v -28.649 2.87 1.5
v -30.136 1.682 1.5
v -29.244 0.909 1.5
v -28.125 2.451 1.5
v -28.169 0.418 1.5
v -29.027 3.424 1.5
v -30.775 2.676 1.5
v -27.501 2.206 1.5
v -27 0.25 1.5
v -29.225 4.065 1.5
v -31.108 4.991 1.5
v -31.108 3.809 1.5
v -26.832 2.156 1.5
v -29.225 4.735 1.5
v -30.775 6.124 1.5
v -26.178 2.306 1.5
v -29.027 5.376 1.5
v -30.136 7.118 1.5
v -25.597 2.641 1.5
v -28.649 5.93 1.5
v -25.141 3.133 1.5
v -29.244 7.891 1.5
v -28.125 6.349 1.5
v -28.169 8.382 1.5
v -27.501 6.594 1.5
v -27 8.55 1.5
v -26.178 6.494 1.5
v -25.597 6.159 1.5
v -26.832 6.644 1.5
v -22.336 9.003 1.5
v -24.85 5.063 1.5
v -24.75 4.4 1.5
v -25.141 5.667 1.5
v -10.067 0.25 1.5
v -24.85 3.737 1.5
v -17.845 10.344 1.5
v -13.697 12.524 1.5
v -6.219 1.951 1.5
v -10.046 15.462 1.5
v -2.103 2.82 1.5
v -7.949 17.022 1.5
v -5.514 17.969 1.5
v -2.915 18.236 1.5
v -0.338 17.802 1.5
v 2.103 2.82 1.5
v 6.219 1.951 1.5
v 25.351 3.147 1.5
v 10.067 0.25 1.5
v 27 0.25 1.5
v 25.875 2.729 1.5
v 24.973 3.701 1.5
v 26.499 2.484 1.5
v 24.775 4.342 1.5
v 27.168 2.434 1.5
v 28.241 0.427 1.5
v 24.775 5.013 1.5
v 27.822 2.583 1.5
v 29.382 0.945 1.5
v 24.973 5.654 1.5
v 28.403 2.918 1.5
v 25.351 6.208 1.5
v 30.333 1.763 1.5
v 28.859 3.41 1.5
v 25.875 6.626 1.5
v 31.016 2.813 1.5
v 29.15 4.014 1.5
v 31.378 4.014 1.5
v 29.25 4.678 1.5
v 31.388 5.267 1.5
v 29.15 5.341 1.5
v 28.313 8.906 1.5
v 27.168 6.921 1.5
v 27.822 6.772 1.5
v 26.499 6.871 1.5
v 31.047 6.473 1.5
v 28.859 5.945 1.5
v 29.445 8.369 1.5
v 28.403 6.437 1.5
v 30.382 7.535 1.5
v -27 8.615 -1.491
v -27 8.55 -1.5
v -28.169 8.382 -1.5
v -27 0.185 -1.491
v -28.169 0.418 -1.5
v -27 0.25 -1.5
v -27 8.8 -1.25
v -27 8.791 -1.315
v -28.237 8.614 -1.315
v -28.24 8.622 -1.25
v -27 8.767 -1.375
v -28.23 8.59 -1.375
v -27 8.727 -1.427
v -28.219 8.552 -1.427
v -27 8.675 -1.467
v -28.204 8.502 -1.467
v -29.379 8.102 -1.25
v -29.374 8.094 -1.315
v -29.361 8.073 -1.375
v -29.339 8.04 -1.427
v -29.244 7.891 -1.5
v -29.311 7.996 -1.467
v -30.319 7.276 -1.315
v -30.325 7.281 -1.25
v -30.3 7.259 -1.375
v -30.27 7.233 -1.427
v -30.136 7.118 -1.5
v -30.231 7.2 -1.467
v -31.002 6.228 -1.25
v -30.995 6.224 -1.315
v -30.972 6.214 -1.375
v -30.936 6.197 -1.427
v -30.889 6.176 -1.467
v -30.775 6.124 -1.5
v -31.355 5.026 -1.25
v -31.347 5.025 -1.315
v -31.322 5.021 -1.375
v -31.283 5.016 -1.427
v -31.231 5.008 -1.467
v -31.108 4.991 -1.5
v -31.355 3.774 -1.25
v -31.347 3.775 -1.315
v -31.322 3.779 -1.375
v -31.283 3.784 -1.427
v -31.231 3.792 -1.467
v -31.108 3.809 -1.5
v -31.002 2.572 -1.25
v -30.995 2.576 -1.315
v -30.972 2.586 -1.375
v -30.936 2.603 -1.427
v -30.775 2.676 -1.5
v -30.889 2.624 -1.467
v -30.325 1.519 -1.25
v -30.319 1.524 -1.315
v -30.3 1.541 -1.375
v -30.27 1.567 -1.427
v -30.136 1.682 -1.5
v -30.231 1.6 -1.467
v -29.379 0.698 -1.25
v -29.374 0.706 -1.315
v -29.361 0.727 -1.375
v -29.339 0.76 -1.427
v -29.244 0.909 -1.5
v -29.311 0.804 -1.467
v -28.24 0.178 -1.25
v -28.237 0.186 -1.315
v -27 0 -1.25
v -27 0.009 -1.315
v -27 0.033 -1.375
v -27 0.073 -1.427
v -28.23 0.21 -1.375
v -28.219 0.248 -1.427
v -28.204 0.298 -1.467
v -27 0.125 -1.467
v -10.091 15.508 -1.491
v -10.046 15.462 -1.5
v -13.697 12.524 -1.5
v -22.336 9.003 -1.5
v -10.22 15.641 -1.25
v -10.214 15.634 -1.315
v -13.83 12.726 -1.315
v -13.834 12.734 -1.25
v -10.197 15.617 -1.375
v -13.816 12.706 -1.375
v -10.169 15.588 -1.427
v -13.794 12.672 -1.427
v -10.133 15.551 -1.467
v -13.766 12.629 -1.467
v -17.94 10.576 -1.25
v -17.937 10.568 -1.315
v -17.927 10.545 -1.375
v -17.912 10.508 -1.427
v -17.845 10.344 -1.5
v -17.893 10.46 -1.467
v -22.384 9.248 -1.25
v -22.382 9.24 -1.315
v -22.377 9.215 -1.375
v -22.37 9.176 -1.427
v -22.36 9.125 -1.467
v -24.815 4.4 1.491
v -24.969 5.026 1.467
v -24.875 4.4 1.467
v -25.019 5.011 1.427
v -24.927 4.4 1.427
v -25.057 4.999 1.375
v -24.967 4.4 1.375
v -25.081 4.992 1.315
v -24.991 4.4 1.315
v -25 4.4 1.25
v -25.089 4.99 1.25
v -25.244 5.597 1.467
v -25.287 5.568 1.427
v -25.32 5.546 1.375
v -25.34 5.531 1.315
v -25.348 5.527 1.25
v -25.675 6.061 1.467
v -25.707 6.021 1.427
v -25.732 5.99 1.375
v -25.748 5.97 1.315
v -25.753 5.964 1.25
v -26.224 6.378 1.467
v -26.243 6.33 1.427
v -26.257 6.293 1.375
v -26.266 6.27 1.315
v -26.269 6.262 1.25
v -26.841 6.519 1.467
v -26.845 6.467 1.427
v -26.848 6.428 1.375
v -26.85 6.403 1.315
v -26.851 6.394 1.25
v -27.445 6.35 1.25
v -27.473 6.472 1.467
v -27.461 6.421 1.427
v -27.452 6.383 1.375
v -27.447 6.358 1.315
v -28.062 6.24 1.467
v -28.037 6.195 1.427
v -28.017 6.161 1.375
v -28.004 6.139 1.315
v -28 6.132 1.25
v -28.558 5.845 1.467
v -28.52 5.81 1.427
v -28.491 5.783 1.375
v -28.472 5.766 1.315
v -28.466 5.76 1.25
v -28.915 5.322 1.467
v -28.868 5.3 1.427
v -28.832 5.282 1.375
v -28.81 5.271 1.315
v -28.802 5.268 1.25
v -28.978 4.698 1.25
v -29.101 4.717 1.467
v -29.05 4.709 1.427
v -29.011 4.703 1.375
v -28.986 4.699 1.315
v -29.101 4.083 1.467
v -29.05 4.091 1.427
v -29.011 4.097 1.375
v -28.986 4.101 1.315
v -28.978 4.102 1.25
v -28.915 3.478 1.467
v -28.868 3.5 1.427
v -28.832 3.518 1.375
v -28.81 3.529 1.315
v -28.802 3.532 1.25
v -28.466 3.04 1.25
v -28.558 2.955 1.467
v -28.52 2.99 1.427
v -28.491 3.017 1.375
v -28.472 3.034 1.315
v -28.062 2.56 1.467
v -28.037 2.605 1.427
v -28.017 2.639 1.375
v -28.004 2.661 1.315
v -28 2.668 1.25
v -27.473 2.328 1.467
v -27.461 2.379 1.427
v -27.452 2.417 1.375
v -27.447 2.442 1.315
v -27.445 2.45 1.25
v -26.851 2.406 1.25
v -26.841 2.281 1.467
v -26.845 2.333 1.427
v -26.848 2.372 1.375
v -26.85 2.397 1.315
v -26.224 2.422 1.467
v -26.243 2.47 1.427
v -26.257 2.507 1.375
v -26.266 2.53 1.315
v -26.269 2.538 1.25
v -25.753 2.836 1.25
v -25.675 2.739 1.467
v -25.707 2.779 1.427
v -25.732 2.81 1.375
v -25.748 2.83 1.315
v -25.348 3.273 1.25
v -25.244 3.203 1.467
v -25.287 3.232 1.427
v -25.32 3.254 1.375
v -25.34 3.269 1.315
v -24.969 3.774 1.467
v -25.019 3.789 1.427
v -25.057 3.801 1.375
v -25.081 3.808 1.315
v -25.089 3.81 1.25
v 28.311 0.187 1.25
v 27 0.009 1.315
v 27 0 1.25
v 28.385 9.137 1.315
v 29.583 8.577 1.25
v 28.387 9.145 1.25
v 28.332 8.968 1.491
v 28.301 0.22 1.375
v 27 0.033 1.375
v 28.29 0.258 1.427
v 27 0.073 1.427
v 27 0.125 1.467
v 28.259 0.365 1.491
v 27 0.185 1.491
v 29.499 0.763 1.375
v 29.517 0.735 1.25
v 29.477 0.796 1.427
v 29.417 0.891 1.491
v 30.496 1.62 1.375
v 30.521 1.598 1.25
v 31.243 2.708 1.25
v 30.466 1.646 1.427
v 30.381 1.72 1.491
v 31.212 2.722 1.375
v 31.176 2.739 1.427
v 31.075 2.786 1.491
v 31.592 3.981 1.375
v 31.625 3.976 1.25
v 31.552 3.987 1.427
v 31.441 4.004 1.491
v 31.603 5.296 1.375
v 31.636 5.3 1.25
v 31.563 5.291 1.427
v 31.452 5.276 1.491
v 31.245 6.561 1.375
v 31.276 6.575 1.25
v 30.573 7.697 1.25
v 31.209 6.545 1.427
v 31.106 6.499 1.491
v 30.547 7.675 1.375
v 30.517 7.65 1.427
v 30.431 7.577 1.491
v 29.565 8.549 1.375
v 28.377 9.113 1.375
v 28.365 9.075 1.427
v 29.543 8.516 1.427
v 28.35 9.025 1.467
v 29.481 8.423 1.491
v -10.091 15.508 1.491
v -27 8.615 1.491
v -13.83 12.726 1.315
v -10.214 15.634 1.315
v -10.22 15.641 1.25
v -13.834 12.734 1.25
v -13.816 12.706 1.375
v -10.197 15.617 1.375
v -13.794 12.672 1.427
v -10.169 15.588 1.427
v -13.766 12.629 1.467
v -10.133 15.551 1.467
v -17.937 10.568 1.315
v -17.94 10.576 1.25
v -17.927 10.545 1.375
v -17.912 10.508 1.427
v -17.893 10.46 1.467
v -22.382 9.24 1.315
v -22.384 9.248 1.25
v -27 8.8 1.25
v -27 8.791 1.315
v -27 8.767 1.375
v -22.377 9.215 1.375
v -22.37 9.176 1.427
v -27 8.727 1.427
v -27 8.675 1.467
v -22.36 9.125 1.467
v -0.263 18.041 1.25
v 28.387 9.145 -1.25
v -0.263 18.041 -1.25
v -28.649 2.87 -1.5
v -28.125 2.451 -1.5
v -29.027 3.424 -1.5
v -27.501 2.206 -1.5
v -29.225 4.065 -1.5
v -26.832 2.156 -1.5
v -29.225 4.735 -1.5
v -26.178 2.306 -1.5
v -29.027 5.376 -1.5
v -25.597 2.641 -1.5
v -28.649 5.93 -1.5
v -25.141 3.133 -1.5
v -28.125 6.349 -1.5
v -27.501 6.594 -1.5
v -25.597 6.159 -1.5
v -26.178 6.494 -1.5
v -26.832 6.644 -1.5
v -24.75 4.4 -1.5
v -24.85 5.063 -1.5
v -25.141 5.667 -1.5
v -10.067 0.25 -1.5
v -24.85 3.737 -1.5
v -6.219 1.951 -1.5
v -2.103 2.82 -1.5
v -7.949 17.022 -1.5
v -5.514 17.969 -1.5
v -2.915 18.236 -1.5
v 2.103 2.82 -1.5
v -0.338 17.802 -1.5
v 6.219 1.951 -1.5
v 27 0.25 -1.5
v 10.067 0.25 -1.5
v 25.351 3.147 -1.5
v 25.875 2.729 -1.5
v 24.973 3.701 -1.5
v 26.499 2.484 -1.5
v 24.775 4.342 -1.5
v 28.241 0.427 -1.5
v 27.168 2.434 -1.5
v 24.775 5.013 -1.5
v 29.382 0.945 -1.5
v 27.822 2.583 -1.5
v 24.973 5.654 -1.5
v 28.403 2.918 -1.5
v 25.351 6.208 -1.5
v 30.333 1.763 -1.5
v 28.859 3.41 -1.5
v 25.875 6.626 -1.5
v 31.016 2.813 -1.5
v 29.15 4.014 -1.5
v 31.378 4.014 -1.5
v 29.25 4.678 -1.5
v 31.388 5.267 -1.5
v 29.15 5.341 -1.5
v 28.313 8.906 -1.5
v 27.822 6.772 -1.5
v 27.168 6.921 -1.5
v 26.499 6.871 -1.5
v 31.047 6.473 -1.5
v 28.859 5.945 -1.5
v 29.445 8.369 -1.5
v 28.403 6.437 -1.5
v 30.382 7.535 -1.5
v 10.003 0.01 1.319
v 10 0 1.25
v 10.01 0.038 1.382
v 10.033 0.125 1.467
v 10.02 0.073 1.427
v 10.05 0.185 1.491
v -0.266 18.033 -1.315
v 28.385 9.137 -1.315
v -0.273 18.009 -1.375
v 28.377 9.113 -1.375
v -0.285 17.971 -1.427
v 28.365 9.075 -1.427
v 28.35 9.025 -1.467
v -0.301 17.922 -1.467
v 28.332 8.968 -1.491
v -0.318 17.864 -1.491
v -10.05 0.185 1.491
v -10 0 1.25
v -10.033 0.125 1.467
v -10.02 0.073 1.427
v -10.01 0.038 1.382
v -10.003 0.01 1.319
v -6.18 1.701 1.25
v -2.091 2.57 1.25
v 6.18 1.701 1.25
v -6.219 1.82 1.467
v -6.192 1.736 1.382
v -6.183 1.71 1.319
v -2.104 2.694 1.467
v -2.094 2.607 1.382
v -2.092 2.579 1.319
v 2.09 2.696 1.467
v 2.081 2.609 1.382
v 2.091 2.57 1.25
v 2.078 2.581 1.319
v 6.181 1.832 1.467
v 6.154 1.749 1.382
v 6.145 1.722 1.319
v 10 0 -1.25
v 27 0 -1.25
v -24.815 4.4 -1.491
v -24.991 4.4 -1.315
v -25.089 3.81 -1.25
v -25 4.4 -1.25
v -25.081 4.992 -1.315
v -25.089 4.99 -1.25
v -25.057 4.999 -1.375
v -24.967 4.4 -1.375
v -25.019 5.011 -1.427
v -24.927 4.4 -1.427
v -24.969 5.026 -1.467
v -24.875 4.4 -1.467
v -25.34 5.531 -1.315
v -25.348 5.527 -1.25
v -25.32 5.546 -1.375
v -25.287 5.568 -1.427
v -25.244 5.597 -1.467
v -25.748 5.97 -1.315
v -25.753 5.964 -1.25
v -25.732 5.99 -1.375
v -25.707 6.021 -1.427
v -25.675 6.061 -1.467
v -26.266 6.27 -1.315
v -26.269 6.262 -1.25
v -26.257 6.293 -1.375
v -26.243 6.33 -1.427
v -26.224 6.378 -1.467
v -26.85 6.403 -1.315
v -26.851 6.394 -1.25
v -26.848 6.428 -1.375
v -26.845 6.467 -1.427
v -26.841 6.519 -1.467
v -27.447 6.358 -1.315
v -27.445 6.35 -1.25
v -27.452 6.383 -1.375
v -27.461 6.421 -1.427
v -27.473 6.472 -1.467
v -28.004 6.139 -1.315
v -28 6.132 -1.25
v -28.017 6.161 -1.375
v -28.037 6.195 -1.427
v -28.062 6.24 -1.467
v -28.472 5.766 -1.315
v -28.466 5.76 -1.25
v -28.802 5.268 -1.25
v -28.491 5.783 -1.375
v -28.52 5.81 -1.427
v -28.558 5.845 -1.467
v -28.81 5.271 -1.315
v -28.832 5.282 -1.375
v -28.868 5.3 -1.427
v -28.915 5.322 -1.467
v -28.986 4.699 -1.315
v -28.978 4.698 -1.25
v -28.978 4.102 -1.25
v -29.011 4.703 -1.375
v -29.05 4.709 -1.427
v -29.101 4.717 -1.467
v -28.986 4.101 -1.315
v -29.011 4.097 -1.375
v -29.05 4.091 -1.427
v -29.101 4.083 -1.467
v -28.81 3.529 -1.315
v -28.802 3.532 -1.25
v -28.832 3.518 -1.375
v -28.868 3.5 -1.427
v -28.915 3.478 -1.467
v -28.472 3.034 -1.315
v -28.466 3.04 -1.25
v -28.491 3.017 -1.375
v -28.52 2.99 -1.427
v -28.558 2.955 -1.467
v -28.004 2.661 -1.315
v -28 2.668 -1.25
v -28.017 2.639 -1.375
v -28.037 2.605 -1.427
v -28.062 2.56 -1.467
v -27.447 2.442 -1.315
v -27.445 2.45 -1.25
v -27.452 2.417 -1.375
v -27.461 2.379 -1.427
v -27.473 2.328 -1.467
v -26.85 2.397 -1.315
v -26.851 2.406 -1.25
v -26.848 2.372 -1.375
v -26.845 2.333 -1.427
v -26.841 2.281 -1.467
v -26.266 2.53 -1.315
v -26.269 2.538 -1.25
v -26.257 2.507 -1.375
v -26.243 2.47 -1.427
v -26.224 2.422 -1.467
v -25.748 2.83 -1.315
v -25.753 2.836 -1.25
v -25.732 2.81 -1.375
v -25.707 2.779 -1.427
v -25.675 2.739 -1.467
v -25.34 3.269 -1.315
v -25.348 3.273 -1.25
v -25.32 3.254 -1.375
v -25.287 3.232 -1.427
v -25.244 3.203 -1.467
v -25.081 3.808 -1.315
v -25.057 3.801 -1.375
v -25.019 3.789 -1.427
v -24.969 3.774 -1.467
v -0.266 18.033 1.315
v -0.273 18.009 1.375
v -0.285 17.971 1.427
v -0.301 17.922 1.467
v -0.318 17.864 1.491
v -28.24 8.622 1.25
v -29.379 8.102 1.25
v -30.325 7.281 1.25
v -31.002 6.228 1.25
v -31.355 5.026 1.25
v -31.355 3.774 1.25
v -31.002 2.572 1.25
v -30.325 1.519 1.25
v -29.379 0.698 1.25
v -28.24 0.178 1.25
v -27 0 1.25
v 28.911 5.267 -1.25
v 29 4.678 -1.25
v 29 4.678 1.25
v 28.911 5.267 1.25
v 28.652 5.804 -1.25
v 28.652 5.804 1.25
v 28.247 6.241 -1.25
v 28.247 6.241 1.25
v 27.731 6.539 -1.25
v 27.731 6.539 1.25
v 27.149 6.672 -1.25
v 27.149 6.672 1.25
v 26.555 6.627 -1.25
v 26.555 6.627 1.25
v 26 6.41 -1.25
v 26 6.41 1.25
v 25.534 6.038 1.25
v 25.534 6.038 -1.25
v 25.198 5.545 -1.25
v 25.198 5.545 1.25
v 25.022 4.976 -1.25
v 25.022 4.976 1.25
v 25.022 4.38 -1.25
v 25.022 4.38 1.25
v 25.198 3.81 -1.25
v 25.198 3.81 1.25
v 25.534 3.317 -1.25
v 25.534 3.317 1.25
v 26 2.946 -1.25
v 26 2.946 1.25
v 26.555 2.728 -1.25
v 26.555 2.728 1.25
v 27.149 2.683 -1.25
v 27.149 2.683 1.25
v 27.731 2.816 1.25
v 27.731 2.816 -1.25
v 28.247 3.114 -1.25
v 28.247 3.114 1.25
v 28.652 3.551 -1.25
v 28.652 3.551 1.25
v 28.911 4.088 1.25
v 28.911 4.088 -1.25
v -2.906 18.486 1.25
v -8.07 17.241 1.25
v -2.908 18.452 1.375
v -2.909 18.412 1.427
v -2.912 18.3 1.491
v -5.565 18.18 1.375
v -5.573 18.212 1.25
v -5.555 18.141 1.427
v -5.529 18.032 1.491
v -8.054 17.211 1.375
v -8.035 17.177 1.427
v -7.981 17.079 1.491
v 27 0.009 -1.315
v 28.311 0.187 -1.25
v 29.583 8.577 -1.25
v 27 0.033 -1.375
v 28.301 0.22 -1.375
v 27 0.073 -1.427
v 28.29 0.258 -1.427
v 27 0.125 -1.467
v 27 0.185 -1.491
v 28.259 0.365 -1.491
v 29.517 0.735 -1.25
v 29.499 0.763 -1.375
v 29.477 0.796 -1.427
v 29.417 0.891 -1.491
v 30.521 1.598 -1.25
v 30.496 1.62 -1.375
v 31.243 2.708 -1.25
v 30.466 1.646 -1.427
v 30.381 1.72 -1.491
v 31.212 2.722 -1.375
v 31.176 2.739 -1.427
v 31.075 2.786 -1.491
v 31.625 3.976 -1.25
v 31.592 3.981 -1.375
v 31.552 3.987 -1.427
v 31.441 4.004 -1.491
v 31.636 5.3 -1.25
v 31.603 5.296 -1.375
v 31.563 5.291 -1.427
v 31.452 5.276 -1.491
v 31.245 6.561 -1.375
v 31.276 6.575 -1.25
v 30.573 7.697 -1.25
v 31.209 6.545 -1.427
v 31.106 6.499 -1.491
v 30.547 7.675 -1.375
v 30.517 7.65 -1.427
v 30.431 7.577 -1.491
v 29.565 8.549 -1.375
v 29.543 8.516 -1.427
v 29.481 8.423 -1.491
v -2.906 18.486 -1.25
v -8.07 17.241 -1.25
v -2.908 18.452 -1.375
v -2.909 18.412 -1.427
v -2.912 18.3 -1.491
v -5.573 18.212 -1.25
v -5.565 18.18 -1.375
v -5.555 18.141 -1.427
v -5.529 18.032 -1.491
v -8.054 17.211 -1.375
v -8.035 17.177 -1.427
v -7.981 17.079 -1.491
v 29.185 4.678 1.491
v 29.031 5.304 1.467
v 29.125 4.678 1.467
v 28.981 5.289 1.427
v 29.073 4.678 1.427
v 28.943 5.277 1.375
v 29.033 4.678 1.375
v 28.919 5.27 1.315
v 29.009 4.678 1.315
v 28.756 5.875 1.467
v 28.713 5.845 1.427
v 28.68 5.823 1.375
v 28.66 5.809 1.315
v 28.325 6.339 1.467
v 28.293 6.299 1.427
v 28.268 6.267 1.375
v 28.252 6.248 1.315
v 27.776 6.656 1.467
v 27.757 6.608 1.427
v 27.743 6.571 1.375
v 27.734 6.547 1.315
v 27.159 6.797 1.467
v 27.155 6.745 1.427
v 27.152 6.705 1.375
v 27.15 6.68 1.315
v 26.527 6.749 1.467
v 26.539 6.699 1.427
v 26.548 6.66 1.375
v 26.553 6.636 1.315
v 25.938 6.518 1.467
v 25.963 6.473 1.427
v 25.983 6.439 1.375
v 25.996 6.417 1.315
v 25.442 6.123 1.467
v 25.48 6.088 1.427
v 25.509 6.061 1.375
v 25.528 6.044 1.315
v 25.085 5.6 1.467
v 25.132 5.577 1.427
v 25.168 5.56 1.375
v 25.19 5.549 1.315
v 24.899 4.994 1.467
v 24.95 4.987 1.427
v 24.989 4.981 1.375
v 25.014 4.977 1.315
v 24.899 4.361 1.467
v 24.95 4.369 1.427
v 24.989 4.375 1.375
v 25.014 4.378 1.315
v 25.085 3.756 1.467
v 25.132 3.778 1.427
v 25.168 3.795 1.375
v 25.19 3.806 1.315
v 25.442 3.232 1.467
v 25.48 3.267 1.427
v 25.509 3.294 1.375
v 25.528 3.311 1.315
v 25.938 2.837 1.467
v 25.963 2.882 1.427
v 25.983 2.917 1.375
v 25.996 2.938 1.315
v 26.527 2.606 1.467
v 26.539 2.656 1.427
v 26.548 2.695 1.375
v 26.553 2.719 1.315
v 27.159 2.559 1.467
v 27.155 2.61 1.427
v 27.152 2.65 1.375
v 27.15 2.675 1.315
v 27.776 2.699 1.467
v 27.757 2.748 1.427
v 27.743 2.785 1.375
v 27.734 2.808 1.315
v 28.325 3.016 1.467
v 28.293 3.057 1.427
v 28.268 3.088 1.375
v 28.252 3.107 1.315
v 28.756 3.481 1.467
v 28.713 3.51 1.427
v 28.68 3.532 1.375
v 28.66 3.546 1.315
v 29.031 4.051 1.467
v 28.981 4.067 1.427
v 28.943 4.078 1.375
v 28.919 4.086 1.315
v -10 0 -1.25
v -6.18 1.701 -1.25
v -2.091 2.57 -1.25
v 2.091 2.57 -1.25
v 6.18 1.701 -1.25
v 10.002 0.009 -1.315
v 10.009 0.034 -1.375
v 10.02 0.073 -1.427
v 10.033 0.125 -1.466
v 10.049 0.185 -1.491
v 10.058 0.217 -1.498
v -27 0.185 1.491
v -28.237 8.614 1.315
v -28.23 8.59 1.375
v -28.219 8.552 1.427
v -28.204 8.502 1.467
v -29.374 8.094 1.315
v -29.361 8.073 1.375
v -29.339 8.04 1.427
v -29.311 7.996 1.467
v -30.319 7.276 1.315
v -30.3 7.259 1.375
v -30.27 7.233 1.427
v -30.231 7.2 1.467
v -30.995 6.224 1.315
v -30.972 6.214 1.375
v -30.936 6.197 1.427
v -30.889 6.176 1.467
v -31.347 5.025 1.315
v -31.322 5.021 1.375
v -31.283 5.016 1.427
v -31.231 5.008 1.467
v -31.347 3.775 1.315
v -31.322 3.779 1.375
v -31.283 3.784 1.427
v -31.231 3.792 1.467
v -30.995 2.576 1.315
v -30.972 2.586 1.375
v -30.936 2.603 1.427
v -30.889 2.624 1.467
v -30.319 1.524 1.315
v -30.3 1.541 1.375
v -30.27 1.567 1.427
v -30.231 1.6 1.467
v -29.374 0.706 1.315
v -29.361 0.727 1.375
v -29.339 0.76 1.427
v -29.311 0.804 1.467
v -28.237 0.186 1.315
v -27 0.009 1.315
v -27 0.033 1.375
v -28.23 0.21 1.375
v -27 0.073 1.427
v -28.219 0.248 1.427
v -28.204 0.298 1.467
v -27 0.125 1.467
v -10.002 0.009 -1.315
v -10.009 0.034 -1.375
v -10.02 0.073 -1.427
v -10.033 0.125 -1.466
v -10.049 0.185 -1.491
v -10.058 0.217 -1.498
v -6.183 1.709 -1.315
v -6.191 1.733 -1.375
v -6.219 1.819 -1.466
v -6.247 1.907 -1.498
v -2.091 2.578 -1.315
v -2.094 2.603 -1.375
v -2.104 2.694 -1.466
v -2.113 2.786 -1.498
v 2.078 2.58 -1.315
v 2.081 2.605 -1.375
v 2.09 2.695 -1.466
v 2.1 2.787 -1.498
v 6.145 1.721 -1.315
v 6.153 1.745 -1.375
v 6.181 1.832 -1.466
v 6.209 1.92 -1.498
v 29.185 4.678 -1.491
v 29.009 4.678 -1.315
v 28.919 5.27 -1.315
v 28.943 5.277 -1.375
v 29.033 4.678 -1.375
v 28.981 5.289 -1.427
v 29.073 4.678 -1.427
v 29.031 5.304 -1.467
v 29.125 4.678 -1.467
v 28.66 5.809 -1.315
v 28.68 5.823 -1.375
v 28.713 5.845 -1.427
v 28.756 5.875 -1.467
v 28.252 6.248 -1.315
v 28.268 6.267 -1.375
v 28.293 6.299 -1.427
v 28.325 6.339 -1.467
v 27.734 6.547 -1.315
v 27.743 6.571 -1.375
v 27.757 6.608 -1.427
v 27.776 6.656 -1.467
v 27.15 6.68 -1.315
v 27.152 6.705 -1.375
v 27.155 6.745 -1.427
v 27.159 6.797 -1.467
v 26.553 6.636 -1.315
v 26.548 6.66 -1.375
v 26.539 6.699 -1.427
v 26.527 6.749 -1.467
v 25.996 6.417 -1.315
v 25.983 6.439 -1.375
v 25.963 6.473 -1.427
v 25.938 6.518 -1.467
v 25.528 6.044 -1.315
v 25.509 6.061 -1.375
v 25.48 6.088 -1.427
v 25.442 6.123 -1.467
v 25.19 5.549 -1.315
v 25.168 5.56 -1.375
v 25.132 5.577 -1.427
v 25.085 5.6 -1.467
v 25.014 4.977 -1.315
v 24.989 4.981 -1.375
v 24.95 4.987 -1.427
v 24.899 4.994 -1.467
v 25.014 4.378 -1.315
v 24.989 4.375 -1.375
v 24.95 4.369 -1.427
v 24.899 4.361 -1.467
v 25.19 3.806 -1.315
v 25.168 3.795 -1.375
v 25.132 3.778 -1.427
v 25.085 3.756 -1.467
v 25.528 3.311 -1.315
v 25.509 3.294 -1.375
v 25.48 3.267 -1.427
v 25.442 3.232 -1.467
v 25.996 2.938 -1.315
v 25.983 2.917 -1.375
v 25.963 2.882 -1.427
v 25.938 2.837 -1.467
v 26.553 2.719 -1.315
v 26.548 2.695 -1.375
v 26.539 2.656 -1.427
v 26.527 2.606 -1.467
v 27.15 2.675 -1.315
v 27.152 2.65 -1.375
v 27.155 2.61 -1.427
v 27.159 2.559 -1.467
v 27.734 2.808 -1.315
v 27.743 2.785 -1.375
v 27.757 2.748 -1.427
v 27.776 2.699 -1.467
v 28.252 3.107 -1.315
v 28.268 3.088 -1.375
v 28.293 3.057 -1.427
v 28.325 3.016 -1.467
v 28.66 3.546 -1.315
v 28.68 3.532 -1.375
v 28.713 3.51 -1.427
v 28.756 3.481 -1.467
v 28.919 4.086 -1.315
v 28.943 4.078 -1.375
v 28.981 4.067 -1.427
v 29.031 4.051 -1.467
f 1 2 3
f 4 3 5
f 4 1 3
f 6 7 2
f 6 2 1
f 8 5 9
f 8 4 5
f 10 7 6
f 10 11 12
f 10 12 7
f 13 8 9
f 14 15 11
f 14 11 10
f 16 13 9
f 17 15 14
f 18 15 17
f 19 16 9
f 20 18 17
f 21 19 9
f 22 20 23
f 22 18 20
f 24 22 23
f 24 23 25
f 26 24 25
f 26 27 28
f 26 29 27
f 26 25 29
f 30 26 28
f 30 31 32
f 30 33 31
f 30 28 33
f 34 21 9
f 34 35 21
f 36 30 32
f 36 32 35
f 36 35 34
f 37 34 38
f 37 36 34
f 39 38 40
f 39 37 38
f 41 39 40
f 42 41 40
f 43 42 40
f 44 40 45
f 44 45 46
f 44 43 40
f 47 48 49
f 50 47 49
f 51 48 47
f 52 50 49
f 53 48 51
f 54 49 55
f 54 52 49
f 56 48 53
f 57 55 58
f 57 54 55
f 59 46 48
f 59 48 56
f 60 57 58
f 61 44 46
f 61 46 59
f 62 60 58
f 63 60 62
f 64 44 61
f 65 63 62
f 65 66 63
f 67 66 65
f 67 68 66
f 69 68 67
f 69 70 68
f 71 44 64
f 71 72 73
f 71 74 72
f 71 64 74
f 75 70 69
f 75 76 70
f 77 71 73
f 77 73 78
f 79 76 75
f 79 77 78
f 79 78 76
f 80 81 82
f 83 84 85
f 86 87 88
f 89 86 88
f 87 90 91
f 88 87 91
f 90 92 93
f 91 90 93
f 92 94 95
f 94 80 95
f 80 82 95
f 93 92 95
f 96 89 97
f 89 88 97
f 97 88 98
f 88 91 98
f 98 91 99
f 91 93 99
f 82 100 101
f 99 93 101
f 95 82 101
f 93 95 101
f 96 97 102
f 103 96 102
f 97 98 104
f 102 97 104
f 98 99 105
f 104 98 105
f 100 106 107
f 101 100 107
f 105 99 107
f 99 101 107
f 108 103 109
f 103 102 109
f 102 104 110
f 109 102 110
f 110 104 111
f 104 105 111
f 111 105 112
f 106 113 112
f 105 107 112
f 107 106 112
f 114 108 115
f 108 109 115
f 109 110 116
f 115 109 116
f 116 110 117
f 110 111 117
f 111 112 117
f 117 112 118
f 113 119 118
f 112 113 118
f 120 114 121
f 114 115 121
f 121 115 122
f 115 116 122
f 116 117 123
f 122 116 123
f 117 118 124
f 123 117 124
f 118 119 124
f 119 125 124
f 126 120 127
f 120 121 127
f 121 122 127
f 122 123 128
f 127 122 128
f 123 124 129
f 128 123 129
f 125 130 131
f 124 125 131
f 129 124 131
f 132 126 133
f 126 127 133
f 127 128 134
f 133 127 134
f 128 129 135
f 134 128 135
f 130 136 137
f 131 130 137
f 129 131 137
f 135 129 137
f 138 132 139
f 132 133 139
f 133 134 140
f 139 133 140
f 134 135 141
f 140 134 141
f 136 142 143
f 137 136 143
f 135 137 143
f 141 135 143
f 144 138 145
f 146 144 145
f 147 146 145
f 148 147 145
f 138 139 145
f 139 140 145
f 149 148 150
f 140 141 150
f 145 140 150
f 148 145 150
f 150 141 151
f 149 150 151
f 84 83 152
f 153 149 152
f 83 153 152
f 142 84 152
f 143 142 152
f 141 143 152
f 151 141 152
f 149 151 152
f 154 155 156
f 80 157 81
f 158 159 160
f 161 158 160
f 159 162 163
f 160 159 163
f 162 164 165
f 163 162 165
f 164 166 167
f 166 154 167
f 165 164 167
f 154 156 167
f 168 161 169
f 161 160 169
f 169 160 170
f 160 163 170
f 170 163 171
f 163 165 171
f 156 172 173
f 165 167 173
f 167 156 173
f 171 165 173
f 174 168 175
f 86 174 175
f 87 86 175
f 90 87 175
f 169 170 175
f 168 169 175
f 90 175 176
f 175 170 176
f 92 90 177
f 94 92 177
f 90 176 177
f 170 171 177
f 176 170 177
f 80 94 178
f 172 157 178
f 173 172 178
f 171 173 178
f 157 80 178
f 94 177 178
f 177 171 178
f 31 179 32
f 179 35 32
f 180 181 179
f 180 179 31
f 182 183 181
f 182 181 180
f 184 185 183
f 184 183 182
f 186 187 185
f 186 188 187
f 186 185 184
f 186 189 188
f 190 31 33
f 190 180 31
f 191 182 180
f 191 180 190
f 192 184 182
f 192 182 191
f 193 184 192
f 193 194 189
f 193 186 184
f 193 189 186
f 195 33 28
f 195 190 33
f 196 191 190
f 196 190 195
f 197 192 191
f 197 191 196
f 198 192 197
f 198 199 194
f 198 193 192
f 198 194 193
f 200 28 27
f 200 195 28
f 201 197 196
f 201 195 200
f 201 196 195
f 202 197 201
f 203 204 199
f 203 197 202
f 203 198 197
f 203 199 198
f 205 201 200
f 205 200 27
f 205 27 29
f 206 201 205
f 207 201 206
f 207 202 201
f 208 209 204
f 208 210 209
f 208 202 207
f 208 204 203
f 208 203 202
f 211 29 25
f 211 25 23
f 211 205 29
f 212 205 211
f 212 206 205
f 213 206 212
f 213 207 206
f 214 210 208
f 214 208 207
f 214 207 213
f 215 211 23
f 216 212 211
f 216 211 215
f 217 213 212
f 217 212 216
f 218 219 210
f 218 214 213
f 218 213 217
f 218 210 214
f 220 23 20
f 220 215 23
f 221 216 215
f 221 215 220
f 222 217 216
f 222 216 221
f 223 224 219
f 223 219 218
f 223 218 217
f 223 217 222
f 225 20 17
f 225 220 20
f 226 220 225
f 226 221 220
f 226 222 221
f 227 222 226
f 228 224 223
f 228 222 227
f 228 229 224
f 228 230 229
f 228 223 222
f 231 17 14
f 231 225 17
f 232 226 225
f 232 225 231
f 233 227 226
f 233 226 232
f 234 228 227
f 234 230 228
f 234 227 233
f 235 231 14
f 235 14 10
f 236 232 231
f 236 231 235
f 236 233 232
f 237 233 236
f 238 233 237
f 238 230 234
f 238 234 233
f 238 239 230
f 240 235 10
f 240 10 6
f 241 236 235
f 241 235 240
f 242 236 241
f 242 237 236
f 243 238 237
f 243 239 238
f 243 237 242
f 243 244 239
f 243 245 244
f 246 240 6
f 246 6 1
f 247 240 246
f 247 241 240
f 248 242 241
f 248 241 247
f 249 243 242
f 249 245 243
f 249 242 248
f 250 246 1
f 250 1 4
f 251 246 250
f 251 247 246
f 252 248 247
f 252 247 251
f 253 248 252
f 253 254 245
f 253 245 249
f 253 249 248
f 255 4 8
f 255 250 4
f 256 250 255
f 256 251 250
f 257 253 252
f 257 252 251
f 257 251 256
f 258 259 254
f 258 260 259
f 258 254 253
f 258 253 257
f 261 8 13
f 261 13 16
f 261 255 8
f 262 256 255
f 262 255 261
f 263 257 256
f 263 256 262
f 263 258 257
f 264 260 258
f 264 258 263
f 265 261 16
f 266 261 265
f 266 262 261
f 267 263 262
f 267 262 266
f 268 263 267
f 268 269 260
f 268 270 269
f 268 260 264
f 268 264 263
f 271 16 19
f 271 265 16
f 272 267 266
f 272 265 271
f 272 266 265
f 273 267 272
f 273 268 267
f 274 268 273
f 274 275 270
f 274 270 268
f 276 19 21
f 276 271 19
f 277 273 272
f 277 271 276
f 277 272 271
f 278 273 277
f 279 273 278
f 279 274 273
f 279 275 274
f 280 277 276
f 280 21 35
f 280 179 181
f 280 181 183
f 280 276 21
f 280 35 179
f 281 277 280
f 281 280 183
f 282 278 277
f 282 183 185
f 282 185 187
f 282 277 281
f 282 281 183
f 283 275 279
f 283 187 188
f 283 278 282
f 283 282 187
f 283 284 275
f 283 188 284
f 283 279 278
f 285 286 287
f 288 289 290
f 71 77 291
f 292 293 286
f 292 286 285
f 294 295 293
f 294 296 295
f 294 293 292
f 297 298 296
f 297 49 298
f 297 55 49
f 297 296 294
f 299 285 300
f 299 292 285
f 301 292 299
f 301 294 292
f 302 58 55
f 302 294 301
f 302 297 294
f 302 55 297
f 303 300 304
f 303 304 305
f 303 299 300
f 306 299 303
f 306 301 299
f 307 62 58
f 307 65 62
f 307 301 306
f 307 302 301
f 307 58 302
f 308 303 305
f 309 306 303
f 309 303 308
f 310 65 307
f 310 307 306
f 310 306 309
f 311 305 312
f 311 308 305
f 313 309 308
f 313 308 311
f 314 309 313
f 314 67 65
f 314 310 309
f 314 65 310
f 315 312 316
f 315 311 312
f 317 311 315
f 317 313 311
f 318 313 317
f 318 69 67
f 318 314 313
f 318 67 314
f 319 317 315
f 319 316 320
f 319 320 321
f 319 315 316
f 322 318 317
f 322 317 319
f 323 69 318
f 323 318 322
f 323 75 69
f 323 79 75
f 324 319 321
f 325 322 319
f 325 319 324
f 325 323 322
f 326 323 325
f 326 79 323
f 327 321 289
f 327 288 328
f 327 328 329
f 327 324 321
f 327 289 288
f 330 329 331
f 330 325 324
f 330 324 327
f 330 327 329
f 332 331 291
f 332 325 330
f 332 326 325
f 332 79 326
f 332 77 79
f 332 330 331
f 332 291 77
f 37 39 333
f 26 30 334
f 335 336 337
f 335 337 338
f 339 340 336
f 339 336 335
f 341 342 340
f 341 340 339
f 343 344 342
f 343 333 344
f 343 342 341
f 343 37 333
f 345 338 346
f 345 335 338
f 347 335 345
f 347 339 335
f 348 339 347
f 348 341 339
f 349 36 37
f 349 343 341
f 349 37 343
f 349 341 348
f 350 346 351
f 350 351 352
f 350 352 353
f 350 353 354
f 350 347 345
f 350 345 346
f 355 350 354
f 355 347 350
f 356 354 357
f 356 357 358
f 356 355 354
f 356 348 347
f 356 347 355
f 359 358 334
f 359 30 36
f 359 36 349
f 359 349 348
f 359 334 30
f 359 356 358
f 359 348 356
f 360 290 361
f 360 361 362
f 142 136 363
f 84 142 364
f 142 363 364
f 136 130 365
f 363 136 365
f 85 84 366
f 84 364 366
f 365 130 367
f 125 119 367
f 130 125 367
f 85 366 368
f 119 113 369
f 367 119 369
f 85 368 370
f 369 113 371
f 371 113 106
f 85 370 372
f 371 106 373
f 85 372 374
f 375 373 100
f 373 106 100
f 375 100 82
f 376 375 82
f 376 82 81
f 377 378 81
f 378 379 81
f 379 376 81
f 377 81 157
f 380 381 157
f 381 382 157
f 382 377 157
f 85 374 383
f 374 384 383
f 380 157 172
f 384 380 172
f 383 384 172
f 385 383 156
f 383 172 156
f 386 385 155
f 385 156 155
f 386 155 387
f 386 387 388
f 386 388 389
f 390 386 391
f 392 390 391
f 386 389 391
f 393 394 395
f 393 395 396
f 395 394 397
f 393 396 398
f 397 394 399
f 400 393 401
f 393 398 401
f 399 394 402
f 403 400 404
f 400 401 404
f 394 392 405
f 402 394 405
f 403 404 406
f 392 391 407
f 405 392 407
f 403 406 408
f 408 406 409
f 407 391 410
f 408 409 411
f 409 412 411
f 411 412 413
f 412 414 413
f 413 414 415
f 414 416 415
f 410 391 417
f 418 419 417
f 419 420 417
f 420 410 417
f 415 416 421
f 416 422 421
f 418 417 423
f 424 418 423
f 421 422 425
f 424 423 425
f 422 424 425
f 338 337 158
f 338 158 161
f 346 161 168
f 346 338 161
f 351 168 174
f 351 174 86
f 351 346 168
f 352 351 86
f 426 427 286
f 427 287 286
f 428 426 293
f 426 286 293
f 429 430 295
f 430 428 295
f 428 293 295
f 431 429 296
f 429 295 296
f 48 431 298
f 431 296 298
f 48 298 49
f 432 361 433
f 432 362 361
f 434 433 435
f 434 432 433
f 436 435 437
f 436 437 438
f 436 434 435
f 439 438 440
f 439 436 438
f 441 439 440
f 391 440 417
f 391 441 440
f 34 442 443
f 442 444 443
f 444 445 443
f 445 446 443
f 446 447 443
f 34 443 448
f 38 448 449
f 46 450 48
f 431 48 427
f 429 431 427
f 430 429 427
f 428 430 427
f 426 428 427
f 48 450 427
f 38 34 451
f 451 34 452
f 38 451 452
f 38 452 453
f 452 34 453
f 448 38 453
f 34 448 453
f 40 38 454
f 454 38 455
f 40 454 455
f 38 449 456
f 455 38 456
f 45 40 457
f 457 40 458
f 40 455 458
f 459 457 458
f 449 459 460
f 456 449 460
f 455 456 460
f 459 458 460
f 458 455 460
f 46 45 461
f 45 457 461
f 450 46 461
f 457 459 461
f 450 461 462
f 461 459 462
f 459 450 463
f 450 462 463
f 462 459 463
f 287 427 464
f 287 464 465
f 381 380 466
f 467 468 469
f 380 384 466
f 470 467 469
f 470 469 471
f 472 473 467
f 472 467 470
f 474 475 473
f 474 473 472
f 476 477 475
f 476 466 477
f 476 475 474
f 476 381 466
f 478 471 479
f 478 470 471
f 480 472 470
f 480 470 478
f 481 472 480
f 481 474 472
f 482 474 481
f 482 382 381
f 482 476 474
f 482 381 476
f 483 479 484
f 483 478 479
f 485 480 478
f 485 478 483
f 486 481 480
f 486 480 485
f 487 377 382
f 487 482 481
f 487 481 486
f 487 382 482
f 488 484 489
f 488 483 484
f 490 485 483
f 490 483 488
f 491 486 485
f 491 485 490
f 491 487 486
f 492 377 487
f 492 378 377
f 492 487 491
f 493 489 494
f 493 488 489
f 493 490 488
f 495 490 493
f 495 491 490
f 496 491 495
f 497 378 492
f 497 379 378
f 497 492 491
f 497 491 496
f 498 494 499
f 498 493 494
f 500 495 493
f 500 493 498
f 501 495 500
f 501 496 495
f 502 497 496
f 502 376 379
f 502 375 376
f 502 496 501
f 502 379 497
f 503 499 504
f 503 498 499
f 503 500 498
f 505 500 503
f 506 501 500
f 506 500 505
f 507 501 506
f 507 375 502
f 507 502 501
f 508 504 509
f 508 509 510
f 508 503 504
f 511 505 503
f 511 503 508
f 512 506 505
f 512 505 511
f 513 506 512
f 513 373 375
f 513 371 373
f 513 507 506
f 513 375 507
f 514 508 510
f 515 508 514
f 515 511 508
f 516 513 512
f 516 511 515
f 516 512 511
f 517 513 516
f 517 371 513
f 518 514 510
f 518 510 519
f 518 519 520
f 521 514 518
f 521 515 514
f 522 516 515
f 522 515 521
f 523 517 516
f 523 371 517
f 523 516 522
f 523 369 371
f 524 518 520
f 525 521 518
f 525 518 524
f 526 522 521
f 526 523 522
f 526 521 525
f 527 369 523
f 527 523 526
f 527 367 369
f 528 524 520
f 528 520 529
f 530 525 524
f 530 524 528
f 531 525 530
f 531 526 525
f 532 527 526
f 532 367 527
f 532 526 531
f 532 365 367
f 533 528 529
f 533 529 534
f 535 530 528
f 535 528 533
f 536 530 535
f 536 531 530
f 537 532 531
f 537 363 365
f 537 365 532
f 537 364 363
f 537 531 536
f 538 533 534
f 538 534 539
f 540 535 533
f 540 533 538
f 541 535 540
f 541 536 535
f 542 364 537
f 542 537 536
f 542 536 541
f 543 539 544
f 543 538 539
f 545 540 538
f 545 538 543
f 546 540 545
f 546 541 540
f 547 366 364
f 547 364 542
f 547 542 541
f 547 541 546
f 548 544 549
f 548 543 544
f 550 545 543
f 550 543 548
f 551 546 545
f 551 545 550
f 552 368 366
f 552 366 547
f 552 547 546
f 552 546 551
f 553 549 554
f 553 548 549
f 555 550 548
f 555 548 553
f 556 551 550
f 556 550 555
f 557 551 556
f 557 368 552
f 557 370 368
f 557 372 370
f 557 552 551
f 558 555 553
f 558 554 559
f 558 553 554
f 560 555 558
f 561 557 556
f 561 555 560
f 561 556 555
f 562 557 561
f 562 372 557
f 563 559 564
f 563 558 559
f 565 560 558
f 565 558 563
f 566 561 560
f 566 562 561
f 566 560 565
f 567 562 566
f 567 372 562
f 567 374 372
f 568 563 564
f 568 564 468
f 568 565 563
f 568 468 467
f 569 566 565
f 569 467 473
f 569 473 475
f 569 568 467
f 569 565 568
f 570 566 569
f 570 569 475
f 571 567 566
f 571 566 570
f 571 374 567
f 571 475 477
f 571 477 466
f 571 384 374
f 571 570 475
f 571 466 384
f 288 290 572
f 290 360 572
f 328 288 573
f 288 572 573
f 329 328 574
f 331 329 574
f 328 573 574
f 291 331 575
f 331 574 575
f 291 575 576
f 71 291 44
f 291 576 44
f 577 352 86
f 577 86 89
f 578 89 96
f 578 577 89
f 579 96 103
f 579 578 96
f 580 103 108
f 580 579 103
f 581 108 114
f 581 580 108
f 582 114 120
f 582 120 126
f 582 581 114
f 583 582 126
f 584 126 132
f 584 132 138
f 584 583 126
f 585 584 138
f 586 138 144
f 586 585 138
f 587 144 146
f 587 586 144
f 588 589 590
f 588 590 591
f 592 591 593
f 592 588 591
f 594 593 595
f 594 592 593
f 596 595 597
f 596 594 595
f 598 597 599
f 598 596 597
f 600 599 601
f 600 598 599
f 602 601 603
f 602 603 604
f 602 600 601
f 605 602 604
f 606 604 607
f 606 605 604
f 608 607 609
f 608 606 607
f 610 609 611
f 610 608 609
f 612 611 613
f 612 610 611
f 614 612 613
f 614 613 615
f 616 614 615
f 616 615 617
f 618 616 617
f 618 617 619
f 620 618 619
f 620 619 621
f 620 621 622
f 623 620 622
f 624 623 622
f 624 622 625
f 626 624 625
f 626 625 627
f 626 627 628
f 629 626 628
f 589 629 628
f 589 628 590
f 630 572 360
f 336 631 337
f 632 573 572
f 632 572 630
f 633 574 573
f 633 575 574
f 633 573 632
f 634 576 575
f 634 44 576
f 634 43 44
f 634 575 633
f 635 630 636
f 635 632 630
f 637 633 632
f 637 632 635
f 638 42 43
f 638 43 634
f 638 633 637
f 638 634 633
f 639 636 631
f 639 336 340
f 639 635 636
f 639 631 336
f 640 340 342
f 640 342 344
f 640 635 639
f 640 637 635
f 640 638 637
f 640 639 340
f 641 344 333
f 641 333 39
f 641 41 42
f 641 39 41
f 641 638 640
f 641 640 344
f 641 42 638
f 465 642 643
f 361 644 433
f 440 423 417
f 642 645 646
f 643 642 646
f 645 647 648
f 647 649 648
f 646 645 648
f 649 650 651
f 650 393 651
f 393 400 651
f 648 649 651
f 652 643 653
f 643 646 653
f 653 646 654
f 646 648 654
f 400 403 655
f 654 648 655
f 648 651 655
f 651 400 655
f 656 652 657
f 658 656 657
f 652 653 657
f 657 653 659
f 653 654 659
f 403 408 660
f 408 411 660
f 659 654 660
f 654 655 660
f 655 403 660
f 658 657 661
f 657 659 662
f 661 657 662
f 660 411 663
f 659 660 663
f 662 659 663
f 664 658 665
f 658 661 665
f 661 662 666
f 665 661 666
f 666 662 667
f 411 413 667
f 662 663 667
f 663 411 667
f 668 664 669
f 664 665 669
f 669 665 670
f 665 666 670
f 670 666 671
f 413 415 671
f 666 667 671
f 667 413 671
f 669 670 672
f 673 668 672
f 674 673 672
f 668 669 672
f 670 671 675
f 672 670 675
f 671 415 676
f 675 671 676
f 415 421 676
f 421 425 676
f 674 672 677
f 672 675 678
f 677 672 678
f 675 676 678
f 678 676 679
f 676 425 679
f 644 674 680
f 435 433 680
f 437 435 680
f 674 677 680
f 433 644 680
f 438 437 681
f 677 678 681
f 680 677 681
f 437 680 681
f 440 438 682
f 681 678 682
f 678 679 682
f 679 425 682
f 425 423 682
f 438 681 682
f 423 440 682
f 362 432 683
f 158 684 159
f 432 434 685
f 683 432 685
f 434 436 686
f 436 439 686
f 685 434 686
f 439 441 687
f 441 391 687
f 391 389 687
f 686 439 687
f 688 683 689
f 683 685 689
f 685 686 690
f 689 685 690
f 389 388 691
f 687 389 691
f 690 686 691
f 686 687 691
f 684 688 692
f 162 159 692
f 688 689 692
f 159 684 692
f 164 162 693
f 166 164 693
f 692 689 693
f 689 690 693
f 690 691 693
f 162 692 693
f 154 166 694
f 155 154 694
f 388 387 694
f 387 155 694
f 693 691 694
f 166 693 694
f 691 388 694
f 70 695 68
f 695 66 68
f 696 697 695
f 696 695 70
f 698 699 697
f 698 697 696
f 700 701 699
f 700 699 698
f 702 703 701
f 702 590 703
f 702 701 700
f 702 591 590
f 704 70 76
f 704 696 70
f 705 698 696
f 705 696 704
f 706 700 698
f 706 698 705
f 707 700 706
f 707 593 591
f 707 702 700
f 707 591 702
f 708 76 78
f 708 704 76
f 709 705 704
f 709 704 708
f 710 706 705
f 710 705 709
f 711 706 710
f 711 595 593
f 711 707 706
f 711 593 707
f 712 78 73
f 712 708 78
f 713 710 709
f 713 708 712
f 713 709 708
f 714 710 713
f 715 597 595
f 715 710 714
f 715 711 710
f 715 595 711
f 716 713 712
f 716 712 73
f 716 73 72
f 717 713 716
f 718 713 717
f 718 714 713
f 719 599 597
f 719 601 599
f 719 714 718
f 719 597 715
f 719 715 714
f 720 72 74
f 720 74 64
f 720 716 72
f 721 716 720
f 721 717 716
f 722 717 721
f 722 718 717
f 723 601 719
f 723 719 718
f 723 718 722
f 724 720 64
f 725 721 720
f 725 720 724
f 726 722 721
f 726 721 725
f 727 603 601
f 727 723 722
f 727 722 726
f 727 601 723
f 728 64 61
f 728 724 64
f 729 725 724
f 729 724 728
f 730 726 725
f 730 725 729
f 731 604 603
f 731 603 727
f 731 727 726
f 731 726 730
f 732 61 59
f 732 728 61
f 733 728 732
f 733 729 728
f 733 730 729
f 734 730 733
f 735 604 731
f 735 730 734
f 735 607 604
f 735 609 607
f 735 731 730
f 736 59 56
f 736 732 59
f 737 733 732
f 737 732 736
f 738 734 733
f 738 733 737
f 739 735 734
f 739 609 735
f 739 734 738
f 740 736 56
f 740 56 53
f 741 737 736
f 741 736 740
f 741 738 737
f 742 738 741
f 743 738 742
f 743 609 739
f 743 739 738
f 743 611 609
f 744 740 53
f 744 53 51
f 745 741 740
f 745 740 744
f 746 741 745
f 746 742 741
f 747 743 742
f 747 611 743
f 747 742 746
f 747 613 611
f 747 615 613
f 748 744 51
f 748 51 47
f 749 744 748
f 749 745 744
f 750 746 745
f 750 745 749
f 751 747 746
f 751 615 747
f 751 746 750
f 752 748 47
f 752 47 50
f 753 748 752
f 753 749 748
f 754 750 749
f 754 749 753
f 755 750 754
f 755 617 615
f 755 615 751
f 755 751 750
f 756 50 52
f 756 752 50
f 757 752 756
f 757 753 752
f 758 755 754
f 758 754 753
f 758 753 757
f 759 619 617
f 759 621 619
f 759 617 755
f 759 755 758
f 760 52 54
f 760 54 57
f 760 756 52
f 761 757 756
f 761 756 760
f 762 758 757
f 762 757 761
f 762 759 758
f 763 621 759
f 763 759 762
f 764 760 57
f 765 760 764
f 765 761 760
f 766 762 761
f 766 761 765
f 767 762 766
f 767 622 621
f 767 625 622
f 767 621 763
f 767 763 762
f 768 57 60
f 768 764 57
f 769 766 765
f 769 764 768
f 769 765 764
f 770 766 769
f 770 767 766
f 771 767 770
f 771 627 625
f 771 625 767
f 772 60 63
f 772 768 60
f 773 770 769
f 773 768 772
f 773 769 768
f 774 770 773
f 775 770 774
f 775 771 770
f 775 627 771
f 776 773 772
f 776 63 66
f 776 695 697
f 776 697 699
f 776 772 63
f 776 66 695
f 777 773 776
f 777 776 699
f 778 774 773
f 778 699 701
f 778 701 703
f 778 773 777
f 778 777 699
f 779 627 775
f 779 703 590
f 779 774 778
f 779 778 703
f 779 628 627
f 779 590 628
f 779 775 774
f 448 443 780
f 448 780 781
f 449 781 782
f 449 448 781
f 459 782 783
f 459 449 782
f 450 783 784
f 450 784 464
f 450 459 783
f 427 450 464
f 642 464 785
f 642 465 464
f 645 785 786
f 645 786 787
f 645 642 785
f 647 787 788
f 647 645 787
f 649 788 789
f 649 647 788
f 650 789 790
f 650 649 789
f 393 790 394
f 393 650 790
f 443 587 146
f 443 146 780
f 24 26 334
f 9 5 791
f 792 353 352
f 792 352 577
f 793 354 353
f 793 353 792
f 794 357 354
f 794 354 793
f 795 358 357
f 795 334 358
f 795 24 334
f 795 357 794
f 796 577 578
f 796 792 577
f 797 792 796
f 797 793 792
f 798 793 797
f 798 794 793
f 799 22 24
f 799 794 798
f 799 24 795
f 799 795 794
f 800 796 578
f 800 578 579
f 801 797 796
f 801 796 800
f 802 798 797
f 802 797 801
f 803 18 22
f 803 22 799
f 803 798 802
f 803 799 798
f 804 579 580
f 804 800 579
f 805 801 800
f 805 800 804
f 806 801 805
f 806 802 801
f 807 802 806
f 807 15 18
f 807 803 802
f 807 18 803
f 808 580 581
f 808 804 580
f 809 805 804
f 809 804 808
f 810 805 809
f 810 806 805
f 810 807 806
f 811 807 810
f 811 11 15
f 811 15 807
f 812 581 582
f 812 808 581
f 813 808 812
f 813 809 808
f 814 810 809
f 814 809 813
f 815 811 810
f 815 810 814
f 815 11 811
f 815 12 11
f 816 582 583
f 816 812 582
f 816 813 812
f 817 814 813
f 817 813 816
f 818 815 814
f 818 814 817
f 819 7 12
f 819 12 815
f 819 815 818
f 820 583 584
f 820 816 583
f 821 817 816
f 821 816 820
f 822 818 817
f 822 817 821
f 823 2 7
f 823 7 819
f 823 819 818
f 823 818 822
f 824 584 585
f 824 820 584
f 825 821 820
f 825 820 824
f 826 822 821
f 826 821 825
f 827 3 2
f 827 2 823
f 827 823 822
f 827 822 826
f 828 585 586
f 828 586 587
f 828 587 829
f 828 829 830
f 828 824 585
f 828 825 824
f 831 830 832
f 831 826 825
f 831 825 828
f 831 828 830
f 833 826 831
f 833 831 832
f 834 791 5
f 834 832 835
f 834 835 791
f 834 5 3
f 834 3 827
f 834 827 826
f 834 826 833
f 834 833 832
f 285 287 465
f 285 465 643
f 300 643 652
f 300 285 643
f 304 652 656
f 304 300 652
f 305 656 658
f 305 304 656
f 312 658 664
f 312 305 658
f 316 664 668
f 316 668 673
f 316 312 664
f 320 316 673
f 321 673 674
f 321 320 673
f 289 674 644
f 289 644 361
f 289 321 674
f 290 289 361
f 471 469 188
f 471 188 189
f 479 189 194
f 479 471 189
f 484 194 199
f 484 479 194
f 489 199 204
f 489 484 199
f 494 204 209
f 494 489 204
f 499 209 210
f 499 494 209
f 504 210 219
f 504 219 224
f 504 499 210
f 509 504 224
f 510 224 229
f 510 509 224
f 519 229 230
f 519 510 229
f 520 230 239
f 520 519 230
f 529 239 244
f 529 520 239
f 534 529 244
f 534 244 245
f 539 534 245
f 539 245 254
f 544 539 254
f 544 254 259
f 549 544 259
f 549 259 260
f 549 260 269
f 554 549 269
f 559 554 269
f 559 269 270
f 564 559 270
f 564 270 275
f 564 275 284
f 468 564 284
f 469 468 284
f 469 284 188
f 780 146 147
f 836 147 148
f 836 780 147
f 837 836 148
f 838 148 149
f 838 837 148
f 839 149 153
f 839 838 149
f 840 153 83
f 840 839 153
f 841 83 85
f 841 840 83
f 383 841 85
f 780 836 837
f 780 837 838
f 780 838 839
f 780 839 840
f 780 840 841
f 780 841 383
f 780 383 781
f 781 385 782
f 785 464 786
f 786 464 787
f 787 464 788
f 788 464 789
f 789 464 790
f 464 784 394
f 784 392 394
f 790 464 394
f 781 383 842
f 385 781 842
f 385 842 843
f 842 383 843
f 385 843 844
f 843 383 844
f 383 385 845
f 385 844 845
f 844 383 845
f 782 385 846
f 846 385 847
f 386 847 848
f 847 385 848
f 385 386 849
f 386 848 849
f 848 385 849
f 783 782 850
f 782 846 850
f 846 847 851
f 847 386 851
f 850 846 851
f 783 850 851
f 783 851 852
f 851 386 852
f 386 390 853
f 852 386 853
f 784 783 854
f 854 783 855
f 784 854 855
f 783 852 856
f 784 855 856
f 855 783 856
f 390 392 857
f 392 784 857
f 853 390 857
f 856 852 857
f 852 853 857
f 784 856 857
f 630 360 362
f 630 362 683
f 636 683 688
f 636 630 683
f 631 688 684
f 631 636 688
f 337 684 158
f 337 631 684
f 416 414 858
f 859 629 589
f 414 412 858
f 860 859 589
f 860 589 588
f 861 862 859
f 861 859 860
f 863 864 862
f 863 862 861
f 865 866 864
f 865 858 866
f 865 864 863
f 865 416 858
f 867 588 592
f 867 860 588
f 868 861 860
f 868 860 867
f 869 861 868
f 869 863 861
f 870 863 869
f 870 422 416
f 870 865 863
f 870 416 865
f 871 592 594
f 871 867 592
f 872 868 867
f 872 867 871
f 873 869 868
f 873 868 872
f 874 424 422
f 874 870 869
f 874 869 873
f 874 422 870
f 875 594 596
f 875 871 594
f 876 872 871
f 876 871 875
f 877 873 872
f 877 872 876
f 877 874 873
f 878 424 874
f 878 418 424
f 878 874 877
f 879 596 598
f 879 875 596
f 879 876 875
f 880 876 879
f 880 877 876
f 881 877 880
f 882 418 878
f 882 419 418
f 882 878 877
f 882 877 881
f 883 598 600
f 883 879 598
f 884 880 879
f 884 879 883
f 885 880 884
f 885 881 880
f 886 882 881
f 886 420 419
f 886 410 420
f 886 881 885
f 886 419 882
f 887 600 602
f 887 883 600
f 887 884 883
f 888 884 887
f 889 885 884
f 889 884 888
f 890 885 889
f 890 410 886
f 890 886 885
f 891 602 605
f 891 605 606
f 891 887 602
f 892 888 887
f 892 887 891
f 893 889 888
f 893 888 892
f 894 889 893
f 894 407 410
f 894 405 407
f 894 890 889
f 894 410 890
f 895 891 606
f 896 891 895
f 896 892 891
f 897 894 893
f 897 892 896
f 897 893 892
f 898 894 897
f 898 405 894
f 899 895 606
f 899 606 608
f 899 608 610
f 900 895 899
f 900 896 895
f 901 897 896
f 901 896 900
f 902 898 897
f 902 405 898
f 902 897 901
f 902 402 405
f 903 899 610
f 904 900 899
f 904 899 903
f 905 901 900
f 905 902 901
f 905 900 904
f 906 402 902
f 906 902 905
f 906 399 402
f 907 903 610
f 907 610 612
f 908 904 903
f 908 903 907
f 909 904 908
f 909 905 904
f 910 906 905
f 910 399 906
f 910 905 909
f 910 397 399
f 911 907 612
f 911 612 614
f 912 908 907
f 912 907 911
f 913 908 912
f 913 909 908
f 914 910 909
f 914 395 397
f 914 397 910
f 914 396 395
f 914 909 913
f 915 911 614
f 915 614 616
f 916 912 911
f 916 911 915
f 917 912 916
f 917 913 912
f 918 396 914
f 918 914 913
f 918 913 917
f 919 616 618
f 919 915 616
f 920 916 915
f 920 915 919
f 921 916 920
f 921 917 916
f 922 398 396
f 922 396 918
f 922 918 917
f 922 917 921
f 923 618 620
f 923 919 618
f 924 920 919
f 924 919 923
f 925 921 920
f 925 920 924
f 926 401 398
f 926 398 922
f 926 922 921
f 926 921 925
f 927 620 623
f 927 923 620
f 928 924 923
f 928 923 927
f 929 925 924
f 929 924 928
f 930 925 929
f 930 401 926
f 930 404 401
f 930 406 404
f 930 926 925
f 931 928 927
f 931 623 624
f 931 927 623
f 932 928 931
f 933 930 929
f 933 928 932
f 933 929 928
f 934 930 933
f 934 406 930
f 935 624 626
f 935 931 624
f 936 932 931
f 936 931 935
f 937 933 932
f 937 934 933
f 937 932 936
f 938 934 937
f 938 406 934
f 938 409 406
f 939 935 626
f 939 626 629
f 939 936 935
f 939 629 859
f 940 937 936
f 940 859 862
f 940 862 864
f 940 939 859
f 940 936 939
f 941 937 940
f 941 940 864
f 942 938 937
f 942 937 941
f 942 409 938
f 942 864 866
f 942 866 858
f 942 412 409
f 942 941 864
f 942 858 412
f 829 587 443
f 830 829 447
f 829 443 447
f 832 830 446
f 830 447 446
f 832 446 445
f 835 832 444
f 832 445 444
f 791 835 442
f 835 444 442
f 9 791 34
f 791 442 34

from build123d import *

# Parameters (mm, degrees)
SKETCH1_R           = 2
BOSS_EXTRUDE1_DEPTH = 1.5
FILLET1_R           = 0.25


with BuildPart() as part:
    # Sketch1 → Boss-Extrude1 (new, symmetric)
    with BuildSketch(Plane.XY):
        with BuildLine():
            Line((-27, 0), (-10, 0))
            ThreePointArc((-10, 0), (0, 2.679491924), (10, 0))
            Line((10, 0), (27, 0))
            ThreePointArc((27, 0), (31.624694854, 3.976110042), (28.387100965, 9.144788729))
            Line((28.387100965, 9.144788729), (-0.263497368, 18.041035978))
            ThreePointArc((-0.263497368, 18.041035978), (-5.572599415, 18.212314535), (-10.22040926, 15.640590494))
            ThreePointArc((-10.22040926, 15.640590494), (-17.939807622, 10.575848406), (-27, 8.8))
            ThreePointArc((-27, 8.8), (-31.4, 4.4), (-27, 0))
        make_face()
        with Locations((27, 4.677593574)):
            Circle(SKETCH1_R, mode=Mode.SUBTRACT)
        with Locations((-27, 4.4)):
            Circle(SKETCH1_R, mode=Mode.SUBTRACT)
    extrude(amount=BOSS_EXTRUDE1_DEPTH, both=True)

    # Fillet1
    fillet1_edges = [part.edges().sort_by_distance(p)[0] for p in [
        (0, 2.679491924, 1.5),
        (-18.5, 0, -1.5),
        (-31.4, 4.4, -1.5),
        (18.5, 0, 1.5),
        (31.624694854, 3.976110042, 1.5),
        (14.061801799, 13.592912353, 1.5),
        (-29, 4.4, -1.5),
        (-29, 4.4, 1.5),
        (-5.572599415, 18.212314535, 1.5),
        (25, 4.677593574, -1.5),
        (25, 4.677593574, 1.5),
        (-17.939807622, 10.575848406, 1.5),
        (-31.4, 4.4, 1.5),
        (-18.5, 0, 1.5),
        (-17.939807622, 10.575848406, -1.5),
        (-5.572599415, 18.212314535, -1.5),
        (14.061801799, 13.592912353, -1.5),
        (31.624694854, 3.976110042, -1.5),
        (18.5, 0, -1.5),
        (0, 2.679491924, -1.5),
    ]]
    fillet(fillet1_edges, radius=FILLET1_R)


solid = part.part
